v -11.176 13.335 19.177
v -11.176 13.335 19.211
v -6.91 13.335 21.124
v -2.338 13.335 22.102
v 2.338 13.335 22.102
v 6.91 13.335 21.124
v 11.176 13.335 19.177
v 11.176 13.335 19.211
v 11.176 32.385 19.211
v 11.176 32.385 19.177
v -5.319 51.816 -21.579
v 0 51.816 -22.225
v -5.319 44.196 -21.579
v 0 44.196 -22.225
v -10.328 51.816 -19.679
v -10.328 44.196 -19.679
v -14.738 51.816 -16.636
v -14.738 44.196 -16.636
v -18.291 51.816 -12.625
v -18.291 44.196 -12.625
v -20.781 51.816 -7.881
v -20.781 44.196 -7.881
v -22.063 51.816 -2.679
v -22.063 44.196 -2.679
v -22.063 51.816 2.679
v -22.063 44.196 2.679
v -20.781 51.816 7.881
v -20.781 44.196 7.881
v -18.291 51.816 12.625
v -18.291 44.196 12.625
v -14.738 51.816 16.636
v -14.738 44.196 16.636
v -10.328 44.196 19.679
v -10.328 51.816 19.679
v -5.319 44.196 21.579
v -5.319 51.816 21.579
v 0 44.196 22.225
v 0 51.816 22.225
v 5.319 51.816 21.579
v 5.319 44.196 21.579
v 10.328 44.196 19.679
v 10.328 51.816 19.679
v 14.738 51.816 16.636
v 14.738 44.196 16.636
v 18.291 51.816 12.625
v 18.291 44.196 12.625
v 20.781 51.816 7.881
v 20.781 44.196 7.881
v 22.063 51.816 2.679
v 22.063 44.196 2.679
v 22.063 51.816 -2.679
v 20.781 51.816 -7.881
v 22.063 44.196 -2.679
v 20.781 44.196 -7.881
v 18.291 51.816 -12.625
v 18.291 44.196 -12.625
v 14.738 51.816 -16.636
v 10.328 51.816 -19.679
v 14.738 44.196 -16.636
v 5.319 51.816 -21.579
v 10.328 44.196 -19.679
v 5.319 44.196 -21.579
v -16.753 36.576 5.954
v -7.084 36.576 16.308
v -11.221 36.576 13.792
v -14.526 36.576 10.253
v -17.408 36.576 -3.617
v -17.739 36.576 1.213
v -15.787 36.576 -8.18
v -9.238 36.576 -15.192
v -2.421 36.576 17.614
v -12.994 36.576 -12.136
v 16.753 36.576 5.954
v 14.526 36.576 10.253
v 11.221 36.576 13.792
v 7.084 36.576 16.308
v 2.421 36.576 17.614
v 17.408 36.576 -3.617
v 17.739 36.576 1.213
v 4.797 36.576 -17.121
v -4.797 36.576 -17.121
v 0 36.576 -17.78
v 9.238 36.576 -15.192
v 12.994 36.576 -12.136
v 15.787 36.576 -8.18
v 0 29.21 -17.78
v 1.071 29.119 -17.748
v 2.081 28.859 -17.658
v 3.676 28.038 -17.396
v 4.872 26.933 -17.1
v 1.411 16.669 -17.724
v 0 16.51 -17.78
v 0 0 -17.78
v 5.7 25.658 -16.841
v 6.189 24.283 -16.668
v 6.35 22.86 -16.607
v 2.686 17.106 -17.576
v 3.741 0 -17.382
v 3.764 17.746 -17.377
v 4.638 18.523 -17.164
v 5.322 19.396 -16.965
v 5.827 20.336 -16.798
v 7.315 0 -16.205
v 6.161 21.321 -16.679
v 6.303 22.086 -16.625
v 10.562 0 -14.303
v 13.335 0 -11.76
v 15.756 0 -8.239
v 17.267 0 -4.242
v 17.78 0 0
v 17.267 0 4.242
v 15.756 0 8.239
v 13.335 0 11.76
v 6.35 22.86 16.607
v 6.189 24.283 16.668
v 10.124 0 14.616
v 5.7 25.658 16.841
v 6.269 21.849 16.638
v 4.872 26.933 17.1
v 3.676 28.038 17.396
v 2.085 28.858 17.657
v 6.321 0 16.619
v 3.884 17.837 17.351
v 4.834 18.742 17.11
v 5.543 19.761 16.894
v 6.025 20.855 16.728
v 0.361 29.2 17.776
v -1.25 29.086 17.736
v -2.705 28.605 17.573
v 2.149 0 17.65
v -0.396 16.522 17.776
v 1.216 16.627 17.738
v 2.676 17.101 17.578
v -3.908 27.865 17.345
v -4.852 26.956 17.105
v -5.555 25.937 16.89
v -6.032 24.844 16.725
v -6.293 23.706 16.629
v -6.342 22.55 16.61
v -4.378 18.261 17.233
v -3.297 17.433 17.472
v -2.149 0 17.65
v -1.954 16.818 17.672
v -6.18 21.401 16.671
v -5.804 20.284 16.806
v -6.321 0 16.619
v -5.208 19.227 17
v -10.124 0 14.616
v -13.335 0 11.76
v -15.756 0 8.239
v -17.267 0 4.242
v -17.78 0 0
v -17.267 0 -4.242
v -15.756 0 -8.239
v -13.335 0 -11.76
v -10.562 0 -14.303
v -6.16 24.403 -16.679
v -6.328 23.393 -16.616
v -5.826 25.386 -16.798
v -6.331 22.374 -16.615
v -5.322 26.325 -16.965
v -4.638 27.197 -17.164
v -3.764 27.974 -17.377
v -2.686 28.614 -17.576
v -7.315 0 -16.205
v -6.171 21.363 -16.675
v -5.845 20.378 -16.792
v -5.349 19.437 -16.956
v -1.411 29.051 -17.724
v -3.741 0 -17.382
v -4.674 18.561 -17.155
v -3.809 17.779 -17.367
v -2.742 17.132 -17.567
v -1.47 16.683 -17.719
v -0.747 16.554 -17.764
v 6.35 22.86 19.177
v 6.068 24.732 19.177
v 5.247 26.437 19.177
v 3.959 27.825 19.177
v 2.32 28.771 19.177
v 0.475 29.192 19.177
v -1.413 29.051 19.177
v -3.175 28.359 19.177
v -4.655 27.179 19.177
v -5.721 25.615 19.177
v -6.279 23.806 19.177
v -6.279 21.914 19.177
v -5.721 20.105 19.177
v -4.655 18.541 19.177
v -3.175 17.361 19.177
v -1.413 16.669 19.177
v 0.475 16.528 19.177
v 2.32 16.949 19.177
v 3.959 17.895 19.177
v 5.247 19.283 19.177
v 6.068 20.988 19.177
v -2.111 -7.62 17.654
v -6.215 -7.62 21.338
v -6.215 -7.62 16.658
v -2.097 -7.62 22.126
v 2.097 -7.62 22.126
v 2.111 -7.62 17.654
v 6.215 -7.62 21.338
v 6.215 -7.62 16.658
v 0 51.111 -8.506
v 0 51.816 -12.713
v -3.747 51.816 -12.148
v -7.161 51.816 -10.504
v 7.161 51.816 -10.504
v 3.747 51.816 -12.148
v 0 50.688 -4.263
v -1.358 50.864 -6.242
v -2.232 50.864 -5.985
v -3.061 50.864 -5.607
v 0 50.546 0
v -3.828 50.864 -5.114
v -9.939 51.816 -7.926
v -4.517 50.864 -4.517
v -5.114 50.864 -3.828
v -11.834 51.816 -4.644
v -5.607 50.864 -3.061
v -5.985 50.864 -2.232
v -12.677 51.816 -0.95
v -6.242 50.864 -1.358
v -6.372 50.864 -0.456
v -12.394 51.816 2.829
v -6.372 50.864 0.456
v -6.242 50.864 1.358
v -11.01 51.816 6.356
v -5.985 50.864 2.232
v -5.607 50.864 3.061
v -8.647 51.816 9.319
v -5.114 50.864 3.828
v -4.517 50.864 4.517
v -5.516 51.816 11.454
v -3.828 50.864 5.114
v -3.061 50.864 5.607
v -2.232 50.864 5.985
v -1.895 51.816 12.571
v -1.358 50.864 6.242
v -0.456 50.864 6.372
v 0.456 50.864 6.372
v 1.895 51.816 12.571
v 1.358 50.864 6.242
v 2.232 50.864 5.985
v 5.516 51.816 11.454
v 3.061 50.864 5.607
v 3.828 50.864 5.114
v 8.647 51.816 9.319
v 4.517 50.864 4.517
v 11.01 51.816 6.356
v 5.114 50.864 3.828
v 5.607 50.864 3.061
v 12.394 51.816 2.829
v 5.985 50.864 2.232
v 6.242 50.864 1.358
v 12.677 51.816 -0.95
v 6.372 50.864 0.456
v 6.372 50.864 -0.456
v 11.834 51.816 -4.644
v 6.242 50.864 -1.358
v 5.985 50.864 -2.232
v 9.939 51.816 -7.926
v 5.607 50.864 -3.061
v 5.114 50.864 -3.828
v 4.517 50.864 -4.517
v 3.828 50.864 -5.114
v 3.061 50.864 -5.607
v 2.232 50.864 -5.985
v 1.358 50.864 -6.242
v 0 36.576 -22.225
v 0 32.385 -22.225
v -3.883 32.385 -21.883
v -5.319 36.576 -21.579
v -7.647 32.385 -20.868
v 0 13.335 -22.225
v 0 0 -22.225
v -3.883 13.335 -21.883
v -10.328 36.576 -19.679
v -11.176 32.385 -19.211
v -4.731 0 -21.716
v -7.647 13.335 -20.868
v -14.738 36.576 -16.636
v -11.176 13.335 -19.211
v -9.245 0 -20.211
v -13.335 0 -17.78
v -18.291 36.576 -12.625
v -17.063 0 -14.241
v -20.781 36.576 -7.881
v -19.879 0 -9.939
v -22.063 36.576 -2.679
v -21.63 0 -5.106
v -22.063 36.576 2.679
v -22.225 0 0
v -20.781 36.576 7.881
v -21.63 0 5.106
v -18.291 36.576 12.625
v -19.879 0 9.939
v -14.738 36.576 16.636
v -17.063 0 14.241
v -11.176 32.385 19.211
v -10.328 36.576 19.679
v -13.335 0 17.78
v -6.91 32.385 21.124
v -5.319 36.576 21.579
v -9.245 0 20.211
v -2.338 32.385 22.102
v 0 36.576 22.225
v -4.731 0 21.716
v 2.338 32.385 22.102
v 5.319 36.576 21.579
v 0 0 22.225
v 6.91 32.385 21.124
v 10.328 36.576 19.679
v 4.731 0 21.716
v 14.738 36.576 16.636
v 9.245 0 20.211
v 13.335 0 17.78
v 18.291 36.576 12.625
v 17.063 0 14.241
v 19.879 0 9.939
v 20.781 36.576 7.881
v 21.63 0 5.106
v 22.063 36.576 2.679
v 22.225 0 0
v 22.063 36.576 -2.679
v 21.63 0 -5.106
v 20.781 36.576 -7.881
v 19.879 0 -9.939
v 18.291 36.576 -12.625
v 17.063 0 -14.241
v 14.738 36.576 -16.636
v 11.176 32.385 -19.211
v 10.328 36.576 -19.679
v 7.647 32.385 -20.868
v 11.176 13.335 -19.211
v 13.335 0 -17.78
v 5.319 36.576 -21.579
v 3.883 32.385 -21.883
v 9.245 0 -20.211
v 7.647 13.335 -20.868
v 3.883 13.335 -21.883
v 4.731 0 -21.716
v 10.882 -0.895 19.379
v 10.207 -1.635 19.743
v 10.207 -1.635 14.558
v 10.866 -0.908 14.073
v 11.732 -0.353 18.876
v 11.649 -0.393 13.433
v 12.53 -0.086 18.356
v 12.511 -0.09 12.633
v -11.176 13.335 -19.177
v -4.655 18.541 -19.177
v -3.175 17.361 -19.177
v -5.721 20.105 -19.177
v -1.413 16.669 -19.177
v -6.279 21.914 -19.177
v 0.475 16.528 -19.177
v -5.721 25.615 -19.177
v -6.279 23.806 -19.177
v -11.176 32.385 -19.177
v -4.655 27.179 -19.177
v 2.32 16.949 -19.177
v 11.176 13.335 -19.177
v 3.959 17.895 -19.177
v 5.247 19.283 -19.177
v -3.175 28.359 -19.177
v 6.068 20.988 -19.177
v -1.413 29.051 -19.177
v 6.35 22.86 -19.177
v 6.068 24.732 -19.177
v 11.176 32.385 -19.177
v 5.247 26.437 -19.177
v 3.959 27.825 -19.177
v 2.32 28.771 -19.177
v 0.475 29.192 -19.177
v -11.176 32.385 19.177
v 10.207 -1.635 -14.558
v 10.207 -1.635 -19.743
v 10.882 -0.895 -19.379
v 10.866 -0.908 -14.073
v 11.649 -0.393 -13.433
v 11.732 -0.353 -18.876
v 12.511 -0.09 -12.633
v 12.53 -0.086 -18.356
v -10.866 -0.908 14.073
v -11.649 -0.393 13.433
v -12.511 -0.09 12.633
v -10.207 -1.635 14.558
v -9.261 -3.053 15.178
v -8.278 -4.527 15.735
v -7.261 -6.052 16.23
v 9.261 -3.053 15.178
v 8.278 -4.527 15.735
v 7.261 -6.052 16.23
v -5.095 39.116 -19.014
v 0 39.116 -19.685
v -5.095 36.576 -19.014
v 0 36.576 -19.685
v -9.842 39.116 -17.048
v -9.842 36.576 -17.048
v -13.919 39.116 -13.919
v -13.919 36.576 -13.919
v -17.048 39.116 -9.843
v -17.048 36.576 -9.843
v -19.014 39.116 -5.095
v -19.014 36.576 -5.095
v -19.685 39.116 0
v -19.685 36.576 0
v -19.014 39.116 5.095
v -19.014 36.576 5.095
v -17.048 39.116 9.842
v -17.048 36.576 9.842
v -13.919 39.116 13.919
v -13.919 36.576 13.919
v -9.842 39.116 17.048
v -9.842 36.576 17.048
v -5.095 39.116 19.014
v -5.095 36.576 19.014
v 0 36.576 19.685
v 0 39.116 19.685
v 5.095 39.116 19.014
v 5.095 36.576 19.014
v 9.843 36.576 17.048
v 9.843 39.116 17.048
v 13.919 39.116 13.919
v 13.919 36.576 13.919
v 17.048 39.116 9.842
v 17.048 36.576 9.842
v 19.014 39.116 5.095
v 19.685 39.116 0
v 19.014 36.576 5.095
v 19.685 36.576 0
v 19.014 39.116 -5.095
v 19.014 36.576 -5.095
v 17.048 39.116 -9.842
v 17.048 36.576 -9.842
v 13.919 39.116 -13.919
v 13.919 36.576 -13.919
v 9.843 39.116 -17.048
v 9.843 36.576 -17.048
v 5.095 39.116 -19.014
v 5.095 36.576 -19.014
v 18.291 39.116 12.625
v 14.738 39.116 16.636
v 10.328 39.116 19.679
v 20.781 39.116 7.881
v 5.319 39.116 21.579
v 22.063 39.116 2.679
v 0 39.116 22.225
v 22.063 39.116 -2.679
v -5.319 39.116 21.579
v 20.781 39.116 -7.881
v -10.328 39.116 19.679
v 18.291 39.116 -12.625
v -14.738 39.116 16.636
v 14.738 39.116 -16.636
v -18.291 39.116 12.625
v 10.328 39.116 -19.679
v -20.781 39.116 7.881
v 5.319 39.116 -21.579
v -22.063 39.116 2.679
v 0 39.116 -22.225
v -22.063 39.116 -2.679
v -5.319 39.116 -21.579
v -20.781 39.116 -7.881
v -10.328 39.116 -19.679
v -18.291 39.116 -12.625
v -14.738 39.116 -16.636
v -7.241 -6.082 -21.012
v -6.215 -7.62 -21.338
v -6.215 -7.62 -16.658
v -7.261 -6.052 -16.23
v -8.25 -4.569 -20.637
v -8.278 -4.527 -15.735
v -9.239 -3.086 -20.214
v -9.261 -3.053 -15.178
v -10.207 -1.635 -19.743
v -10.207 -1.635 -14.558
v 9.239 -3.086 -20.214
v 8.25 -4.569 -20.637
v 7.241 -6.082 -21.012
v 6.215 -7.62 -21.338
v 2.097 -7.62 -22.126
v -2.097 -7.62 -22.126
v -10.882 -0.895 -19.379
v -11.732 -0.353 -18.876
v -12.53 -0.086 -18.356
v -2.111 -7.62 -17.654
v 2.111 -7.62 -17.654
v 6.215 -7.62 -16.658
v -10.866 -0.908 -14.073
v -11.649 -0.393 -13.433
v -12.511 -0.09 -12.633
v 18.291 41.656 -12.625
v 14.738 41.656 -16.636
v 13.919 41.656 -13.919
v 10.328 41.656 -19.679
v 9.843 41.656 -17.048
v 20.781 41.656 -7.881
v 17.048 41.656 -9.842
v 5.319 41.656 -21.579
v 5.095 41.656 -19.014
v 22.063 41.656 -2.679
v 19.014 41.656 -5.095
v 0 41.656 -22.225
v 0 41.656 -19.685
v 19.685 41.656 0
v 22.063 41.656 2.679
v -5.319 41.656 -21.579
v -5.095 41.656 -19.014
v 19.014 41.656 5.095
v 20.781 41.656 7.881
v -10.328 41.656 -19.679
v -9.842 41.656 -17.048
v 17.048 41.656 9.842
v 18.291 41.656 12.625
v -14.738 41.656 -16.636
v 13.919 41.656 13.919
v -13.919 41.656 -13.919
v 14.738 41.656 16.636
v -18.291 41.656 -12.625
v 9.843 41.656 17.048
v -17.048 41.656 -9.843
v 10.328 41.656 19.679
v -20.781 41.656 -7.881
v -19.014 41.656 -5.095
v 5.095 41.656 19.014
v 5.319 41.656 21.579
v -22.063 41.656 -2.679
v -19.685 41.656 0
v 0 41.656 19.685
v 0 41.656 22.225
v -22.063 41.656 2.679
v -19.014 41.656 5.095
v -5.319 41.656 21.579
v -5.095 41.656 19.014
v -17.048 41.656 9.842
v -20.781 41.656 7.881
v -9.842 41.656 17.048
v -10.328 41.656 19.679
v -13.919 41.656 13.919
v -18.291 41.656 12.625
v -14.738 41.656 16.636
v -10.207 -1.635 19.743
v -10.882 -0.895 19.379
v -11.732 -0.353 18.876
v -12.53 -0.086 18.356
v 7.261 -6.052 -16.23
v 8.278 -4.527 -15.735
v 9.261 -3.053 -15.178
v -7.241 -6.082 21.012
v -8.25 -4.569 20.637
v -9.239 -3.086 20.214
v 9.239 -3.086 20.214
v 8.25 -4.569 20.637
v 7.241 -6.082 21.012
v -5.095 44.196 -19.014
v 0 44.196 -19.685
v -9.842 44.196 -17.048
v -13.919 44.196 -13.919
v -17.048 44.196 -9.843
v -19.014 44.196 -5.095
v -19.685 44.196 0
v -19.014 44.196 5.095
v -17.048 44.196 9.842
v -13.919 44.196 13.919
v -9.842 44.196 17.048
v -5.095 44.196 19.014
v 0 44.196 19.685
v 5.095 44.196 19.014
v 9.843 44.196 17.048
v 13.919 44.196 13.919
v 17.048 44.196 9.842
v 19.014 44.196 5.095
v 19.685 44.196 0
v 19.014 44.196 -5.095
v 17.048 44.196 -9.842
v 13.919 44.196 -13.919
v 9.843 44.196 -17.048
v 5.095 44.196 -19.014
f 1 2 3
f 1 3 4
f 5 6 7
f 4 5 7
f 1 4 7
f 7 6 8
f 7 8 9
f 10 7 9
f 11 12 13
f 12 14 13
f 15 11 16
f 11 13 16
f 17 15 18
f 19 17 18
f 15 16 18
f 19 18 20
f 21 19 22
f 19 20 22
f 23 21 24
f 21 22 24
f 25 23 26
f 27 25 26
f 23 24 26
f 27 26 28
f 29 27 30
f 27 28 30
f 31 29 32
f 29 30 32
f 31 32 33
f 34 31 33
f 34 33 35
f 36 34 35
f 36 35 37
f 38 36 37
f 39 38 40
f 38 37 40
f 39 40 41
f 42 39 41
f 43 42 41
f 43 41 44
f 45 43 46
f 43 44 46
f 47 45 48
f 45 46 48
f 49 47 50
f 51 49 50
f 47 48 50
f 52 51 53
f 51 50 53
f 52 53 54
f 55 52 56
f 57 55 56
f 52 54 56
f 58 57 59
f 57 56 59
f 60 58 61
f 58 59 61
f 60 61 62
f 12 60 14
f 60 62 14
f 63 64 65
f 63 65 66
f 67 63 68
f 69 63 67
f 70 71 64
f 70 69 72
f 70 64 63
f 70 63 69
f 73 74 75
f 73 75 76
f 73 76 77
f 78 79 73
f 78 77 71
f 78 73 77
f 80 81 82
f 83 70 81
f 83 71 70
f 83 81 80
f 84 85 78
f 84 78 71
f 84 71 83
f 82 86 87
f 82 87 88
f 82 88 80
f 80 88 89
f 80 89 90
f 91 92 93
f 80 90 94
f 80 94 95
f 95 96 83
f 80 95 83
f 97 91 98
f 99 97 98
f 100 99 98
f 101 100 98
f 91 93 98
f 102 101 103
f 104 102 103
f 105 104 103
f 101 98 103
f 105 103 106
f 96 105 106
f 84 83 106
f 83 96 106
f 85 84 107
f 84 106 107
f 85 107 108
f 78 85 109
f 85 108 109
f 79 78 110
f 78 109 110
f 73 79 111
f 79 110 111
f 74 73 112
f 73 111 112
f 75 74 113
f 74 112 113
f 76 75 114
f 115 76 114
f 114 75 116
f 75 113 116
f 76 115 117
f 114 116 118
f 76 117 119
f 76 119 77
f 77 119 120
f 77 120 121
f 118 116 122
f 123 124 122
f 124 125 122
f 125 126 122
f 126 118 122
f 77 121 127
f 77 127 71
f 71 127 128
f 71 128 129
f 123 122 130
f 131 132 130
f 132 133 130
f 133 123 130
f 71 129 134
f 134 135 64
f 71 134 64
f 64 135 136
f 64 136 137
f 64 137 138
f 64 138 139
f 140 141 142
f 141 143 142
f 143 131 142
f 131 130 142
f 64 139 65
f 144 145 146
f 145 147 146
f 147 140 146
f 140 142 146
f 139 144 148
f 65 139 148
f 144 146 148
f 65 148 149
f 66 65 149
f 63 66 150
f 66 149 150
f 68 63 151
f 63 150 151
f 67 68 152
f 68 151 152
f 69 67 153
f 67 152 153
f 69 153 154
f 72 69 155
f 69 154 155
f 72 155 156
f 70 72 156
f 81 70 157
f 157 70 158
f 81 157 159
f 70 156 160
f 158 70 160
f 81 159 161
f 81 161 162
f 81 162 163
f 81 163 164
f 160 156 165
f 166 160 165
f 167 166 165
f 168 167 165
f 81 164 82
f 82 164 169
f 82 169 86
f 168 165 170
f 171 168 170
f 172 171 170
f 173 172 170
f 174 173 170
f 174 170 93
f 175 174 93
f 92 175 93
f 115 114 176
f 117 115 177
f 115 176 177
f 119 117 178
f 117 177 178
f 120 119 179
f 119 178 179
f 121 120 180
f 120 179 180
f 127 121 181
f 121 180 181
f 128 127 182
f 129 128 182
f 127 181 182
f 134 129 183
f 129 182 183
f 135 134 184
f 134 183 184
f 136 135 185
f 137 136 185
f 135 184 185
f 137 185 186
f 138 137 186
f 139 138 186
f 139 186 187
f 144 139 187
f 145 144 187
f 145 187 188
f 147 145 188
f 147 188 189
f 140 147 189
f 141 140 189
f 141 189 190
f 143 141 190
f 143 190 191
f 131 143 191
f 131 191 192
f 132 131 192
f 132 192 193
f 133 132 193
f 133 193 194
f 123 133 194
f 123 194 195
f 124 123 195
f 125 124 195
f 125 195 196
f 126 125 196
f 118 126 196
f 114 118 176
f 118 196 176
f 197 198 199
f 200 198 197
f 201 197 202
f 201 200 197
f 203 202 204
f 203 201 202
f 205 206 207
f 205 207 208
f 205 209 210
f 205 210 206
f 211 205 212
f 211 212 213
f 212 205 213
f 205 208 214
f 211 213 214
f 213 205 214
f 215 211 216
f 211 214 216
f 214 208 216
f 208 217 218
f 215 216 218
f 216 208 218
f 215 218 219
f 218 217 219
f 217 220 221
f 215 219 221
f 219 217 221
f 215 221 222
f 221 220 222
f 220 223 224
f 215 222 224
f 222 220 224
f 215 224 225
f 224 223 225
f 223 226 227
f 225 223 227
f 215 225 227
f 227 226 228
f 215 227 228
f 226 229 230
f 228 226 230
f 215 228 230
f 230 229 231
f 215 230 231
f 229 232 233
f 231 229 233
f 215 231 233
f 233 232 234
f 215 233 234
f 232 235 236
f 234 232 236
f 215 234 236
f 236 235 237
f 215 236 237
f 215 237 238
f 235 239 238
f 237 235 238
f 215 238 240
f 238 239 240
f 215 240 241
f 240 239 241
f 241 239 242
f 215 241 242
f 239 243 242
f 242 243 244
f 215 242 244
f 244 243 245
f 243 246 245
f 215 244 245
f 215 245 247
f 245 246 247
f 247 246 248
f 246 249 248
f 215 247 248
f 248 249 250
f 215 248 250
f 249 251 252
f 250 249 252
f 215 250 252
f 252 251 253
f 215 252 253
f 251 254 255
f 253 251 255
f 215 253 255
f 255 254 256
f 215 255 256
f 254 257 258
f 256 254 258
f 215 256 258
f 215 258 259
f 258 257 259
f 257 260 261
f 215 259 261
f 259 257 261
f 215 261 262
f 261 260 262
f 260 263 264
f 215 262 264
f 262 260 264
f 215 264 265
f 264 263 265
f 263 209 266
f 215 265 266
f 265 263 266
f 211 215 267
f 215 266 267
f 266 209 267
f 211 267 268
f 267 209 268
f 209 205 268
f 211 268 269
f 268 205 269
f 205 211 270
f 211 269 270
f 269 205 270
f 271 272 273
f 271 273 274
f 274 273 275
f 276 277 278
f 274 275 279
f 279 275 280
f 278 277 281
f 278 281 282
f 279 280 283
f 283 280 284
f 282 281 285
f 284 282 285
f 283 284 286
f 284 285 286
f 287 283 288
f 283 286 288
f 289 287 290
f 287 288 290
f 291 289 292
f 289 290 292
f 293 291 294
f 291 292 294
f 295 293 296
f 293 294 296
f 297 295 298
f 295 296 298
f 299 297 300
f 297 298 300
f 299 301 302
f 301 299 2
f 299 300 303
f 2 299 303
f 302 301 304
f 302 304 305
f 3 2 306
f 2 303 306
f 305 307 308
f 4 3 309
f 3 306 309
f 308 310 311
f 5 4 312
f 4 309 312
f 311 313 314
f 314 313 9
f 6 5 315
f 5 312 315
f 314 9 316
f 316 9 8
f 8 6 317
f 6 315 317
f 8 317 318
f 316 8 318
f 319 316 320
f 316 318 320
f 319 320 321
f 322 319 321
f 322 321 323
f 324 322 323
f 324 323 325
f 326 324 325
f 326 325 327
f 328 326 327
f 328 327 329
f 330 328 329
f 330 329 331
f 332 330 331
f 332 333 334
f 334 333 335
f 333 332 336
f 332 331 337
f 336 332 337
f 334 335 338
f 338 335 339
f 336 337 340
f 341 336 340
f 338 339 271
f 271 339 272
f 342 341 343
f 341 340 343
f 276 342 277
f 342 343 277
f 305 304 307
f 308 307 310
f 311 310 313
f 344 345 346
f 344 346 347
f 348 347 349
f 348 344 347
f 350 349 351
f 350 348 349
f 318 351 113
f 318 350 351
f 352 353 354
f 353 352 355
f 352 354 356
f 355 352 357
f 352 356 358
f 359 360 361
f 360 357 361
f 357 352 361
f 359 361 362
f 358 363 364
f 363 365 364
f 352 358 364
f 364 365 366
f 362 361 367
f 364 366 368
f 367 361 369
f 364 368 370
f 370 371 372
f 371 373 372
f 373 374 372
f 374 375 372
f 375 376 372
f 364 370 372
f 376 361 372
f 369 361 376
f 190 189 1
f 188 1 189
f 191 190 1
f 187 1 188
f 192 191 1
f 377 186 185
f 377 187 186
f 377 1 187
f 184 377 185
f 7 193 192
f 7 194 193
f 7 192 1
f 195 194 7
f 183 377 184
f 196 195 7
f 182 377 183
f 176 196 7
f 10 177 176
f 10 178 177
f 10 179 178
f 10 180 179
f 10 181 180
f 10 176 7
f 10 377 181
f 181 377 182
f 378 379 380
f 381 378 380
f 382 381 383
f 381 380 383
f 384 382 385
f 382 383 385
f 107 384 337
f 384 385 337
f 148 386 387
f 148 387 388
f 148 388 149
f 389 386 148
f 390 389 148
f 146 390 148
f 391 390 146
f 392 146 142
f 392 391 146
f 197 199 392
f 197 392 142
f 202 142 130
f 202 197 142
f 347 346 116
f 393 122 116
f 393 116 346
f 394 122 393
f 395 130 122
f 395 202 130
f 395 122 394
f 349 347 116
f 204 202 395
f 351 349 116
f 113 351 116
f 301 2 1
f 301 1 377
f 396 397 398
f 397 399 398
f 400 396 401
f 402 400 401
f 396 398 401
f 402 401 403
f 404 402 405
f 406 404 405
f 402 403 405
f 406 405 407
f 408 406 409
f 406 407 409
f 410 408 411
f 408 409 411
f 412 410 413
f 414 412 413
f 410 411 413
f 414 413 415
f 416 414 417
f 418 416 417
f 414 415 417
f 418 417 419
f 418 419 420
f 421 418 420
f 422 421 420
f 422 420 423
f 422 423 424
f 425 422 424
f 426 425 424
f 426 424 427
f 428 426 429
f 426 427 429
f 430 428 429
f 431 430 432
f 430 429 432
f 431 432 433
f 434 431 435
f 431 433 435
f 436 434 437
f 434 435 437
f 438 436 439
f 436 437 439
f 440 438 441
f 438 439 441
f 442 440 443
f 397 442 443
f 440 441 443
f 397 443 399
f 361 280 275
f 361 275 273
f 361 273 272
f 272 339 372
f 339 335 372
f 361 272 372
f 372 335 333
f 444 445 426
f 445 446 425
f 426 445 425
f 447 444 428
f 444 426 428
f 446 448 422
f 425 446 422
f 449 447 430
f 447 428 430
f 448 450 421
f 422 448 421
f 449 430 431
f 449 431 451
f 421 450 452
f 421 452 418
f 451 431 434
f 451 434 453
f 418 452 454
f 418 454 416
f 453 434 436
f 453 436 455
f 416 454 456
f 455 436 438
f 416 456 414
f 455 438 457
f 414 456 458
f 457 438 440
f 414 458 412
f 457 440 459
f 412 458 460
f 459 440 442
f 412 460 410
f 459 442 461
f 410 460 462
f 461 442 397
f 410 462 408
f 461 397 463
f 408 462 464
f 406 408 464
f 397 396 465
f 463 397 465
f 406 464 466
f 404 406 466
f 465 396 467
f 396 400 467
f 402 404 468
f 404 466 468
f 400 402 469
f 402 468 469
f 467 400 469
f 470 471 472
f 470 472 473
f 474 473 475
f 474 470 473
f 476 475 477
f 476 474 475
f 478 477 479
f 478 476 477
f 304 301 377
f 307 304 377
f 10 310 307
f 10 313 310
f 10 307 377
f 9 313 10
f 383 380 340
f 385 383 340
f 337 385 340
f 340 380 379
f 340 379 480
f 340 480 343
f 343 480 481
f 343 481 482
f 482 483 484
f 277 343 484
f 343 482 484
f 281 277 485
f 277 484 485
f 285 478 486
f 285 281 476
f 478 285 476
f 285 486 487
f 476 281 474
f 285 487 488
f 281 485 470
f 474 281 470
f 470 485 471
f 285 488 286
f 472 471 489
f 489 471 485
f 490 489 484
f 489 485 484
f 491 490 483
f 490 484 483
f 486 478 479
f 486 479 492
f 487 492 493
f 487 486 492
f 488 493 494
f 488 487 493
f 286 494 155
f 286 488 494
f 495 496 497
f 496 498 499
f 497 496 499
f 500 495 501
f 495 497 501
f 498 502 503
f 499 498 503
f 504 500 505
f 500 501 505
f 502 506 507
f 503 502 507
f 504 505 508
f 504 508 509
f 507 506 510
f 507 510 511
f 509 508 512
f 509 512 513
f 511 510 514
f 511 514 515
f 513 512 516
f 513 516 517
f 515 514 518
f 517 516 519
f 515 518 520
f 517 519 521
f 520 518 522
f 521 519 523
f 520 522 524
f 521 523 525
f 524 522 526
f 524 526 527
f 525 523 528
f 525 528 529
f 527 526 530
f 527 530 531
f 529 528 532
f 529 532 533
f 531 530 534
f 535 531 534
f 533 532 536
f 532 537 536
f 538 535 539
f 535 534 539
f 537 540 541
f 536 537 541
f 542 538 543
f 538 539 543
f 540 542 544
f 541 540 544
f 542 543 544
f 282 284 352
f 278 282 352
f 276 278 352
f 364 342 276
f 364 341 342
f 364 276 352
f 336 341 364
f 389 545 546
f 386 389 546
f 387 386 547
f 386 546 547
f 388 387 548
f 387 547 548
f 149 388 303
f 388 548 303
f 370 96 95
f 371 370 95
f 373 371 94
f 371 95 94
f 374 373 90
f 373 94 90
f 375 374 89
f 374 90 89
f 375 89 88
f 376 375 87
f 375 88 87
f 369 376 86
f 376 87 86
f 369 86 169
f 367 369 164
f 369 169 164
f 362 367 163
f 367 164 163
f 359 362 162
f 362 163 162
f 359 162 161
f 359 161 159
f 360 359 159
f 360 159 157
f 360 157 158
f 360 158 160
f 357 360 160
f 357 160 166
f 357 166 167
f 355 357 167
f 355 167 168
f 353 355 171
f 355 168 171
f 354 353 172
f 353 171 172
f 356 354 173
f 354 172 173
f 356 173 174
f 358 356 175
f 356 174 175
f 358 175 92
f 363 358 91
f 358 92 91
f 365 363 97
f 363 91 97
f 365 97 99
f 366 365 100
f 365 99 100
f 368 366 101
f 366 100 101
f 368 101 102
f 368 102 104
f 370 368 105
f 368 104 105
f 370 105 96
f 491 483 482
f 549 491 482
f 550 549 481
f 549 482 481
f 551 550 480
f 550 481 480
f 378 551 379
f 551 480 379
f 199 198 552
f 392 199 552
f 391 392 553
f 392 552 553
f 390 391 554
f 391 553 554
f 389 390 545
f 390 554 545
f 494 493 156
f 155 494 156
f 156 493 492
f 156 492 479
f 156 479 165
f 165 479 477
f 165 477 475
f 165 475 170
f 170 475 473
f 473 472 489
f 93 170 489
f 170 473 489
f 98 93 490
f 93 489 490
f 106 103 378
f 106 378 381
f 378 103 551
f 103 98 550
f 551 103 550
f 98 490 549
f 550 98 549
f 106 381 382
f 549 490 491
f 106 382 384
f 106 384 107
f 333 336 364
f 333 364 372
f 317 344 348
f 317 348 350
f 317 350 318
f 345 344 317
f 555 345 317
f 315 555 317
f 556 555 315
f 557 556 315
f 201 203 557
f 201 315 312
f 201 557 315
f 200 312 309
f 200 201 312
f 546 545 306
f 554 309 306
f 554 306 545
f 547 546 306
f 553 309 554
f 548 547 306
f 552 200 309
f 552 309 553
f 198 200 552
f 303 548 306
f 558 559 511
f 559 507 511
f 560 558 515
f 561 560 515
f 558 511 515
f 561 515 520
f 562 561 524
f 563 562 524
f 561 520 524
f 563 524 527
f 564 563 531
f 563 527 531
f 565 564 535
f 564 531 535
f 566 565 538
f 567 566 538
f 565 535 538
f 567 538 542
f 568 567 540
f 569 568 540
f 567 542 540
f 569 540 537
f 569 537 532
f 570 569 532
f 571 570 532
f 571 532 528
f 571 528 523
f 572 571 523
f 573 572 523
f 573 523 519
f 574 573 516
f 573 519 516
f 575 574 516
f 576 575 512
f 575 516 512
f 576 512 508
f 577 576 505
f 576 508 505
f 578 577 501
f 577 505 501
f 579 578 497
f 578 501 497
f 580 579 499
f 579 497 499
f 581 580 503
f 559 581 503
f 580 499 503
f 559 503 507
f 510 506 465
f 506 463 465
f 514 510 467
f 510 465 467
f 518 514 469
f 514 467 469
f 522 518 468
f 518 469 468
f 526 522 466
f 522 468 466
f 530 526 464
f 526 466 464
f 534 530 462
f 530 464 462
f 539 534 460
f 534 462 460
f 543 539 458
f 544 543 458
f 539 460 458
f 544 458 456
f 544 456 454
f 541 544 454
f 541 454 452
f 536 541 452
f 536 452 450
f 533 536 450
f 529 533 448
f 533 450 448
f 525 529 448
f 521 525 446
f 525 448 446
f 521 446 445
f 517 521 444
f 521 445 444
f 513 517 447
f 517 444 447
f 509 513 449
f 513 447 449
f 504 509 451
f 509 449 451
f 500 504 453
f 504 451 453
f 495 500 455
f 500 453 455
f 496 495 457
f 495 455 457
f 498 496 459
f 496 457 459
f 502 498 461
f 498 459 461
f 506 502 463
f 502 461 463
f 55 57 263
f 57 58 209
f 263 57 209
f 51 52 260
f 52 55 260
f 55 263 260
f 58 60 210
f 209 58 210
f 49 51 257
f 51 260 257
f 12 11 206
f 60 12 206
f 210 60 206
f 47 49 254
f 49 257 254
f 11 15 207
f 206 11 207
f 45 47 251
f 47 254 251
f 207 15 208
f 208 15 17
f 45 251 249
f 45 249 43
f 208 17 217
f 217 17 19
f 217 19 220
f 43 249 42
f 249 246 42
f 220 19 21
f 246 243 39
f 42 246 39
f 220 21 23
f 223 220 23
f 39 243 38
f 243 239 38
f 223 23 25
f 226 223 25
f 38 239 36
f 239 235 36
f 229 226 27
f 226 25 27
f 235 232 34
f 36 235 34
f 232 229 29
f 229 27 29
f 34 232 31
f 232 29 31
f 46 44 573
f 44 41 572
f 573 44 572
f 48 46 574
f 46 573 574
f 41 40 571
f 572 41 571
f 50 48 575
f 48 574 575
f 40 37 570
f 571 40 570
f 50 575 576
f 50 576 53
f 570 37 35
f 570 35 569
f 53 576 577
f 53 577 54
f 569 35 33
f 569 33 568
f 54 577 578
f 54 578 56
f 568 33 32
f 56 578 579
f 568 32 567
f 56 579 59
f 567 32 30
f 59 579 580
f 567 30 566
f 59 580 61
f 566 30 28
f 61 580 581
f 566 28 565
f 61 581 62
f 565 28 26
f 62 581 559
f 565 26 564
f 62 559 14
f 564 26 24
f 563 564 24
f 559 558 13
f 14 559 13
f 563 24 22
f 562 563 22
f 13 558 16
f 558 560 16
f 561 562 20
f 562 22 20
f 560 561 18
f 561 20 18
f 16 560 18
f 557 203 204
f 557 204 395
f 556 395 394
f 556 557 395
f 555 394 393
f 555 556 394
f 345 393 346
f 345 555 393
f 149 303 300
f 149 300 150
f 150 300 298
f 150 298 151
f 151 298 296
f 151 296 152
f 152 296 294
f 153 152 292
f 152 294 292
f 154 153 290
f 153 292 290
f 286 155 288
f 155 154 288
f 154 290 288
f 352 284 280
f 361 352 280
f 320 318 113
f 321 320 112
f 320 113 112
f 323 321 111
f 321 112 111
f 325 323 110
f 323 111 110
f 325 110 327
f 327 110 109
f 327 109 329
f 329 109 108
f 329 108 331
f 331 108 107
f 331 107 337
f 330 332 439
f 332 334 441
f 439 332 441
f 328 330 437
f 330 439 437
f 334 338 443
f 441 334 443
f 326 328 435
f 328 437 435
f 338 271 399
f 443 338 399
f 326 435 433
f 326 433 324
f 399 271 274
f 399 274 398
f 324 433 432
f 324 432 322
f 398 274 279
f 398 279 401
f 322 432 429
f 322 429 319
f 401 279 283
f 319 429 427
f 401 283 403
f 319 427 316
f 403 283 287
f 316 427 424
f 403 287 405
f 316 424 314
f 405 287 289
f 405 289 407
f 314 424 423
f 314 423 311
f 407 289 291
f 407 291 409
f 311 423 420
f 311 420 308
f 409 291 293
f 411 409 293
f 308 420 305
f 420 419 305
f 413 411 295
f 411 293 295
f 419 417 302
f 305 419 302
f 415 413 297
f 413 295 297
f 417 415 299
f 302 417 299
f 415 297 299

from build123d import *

# Parameters (mm, degrees)
SKETCH2_R            = 6.35
CUT_EXTRUDE2_DEPTH   = 72.795898079
SKETCH2_4_W          = 22.352
SKETCH2_4_H          = 19.05
SKETCH2_4_R          = 6.35
CUT_EXTRUDE3_DEPTH   = 3.048
SKETCH3_R            = 17.78
CUT_EXTRUDE4_DEPTH   = 36.576
BOSS_EXTRUDE1_START  = 7.62
BOSS_EXTRUDE1_DEPTH  = 7.62
CUT_EXTRUDE5_DEPTH   = 12.7
MIRROR3_COPY_1_DEPTH = 12.7


with BuildPart() as part:
    # Sketch1 → Revolve1 (revolve)
    with BuildSketch(Plane.XY):
        with BuildLine():
            Line((0, 0), (0, 50.546))
            ThreePointArc((0, 50.546), (6.387986381, 50.864288237), (12.712693656, 51.816))
            Line((12.712693656, 51.816), (22.225, 51.816))
            Line((22.225, 51.816), (22.225, 44.196))
            Line((22.225, 44.196), (19.685, 44.196))
            Line((19.685, 44.196), (19.685, 41.656))
            Line((19.685, 41.656), (22.225, 41.656))
            Line((22.225, 41.656), (22.225, 39.116))
            Line((22.225, 39.116), (19.685, 39.116))
            Line((19.685, 39.116), (19.685, 36.576))
            Line((19.685, 36.576), (22.225, 36.576))
            Line((22.225, 36.576), (22.225, 0))
            Line((22.225, 0), (0, 0))
        make_face()
    revolve(axis=Axis((0, 0, 0), (0, 1, 0)))

    # Sketch2 → Cut-Extrude2 (cut, through all)
    with BuildSketch(Plane.XY.offset(22.225)):
        with Locations((0, 22.86)):
            Circle(SKETCH2_R)
    extrude(amount=-CUT_EXTRUDE2_DEPTH, mode=Mode.SUBTRACT)

    # Sketch2<4> → Cut-Extrude3 (cut)
    with BuildSketch(Plane.XY.offset(22.225)):
        with Locations((0, 22.86)):
            Rectangle(SKETCH2_4_W, SKETCH2_4_H)
        with Locations((0, 22.86)):
            Circle(SKETCH2_4_R, mode=Mode.SUBTRACT)
    cut_extrude3 = extrude(amount=-CUT_EXTRUDE3_DEPTH, mode=Mode.SUBTRACT)

    # Mirror1: Cut-Extrude3 across plane
    add(cut_extrude3.mirror(Plane.XY), mode=Mode.SUBTRACT)

    # Sketch3 → Cut-Extrude4 (cut)
    with BuildSketch(Plane.XZ):
        Circle(SKETCH3_R)
    extrude(amount=-CUT_EXTRUDE4_DEPTH, mode=Mode.SUBTRACT)

    # Sketch4 → Boss-Extrude1 (add)
    with BuildSketch(Plane.XZ.offset(BOSS_EXTRUDE1_START)):
        with BuildLine():
            Line((-13.335, 17.78), (-13.335, 11.760364578))
            ThreePointArc((-13.335, 11.760364578), (0, 17.78), (13.335, 11.760364578))
            Line((13.335, 11.760364578), (13.335, 17.78))
            ThreePointArc((13.335, 17.78), (0, 22.225), (-13.335, 17.78))
        make_face()
    boss_extrude1 = extrude(amount=-BOSS_EXTRUDE1_DEPTH)

    # Sketch5 → Cut-Extrude5 (cut)
    with BuildSketch(Plane.XY.offset(22.225)):
        with BuildLine():
            Line((-6.215335004, -7.62), (-10.207026408, -1.634711235))
            ThreePointArc((-10.207026408, -1.634711235), (-11.57031167, -0.433318923), (-13.335, 0))
            Line((-13.335, 0), (-13.335, -7.62))
            Line((-13.335, -7.62), (-6.215335004, -7.62))
        make_face()
    cut_extrude5 = extrude(amount=-CUT_EXTRUDE5_DEPTH, mode=Mode.SUBTRACT)

    # Mirror2: Cut-Extrude5 across plane
    add(cut_extrude5.mirror(Plane(origin=(0, 0, 0), x_dir=(0, 0, 1), z_dir=(1, 0, 0))), mode=Mode.SUBTRACT)

    # Mirror3: Boss-Extrude1, Cut-Extrude5 across plane
    add(boss_extrude1.mirror(Plane.XY))
    add(cut_extrude5.mirror(Plane.XY), mode=Mode.SUBTRACT)

    # Mirror3 copy 1 sketch → Mirror3 copy 1 (cut)
    with BuildSketch(Plane(origin=(0, 0, -22.225), x_dir=(-1, 0, 0), z_dir=(0, 0, -1))):
        with BuildLine():
            Line((-6.215335004, -7.62), (-10.207026408, -1.634711235))
            ThreePointArc((-10.207026408, -1.634711235), (-11.57031167, -0.433318923), (-13.335, 0))
            Line((-13.335, 0), (-13.335, -7.62))
            Line((-13.335, -7.62), (-6.215335004, -7.62))
        make_face()
    extrude(amount=-MIRROR3_COPY_1_DEPTH, mode=Mode.SUBTRACT)


solid = part.part
